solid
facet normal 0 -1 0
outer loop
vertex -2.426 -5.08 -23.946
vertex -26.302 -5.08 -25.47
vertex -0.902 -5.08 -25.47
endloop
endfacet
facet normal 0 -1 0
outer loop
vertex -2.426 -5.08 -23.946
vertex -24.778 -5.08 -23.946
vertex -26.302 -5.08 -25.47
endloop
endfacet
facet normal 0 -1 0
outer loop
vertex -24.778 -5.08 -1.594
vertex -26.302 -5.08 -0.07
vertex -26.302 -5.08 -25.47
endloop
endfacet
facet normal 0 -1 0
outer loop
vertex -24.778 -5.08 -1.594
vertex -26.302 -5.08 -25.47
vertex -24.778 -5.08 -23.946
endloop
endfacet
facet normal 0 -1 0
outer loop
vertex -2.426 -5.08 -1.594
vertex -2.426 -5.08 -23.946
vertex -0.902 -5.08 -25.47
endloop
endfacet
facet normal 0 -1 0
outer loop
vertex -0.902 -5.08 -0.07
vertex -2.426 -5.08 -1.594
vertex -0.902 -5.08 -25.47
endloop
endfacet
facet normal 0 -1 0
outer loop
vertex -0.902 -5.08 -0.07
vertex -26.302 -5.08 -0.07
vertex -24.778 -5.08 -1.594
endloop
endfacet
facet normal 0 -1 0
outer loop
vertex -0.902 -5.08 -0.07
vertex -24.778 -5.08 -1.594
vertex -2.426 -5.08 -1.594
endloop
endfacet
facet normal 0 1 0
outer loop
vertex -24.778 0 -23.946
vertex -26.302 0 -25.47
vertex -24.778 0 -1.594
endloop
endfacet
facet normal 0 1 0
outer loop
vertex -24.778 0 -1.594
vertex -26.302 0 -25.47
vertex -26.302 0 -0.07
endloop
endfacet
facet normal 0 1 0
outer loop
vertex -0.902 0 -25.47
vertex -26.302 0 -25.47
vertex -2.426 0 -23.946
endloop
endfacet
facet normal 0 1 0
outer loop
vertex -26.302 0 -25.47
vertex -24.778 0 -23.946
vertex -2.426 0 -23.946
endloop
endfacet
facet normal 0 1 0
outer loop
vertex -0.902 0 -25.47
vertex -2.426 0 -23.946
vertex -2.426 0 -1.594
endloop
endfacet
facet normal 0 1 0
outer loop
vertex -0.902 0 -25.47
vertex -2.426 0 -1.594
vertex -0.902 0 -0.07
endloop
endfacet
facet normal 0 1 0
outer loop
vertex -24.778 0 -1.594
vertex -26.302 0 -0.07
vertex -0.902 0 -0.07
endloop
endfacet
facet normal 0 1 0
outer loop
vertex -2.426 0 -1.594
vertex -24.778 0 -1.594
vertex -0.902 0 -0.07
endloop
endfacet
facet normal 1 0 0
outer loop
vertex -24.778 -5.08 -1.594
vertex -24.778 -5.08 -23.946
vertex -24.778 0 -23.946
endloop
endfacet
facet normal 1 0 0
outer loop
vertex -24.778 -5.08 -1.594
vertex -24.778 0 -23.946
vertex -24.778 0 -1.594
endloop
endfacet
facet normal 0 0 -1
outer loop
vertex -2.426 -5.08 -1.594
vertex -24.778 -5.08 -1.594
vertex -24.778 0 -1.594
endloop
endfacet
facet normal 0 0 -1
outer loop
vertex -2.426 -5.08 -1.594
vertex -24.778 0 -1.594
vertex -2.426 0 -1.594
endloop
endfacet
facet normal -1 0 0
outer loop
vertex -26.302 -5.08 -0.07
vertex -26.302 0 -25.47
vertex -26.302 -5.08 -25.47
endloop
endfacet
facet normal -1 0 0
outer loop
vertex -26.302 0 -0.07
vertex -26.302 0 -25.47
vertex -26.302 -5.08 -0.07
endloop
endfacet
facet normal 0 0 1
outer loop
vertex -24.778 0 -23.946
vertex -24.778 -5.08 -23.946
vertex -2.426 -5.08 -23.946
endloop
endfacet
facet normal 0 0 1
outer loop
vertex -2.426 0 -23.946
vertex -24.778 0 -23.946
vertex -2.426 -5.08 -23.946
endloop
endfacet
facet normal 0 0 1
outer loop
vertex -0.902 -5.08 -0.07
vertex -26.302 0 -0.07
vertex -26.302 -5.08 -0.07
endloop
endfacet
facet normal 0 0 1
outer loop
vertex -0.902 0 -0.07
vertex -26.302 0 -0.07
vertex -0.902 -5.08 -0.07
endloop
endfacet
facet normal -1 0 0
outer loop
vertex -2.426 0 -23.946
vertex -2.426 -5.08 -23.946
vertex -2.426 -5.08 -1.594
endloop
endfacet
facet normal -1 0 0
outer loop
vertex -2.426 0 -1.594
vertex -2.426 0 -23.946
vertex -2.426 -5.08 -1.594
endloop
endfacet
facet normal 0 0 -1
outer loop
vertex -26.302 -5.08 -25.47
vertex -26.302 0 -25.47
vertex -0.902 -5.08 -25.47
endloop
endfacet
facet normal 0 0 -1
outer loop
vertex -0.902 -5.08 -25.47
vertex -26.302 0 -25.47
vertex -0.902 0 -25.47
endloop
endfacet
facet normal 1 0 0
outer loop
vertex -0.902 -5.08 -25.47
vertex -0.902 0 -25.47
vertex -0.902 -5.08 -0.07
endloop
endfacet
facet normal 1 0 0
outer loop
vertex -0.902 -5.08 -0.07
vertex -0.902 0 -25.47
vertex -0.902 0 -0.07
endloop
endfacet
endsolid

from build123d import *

# Parameters (mm, degrees)
F0_W          = 25.4
F0_H          = 25.4
F1_DEPTH      = 5.08
F2_W          = 22.352
F2_H          = 22.352
F3_DEPTH      = 25.4
F3_DEPTH_BACK = 25.4


with BuildPart() as f1:
    # F0 (on Front) → F1 (new body)
    with BuildSketch(Plane.XZ):
        with Locations((-13.602283, -12.769573)):
            Rectangle(F0_W, F0_H)
    extrude(amount=F1_DEPTH)

    # F2 (on face) → F3 (cut, two sides)
    with BuildSketch(Plane.XZ.offset(5.08)) as f3_sk:
        with Locations((-13.602283, -12.769573)):
            Rectangle(F2_W, F2_H)
    extrude(amount=-F3_DEPTH, mode=Mode.SUBTRACT)
    extrude(f3_sk.sketch, amount=-F3_DEPTH_BACK, mode=Mode.SUBTRACT)


solid = f1.part
